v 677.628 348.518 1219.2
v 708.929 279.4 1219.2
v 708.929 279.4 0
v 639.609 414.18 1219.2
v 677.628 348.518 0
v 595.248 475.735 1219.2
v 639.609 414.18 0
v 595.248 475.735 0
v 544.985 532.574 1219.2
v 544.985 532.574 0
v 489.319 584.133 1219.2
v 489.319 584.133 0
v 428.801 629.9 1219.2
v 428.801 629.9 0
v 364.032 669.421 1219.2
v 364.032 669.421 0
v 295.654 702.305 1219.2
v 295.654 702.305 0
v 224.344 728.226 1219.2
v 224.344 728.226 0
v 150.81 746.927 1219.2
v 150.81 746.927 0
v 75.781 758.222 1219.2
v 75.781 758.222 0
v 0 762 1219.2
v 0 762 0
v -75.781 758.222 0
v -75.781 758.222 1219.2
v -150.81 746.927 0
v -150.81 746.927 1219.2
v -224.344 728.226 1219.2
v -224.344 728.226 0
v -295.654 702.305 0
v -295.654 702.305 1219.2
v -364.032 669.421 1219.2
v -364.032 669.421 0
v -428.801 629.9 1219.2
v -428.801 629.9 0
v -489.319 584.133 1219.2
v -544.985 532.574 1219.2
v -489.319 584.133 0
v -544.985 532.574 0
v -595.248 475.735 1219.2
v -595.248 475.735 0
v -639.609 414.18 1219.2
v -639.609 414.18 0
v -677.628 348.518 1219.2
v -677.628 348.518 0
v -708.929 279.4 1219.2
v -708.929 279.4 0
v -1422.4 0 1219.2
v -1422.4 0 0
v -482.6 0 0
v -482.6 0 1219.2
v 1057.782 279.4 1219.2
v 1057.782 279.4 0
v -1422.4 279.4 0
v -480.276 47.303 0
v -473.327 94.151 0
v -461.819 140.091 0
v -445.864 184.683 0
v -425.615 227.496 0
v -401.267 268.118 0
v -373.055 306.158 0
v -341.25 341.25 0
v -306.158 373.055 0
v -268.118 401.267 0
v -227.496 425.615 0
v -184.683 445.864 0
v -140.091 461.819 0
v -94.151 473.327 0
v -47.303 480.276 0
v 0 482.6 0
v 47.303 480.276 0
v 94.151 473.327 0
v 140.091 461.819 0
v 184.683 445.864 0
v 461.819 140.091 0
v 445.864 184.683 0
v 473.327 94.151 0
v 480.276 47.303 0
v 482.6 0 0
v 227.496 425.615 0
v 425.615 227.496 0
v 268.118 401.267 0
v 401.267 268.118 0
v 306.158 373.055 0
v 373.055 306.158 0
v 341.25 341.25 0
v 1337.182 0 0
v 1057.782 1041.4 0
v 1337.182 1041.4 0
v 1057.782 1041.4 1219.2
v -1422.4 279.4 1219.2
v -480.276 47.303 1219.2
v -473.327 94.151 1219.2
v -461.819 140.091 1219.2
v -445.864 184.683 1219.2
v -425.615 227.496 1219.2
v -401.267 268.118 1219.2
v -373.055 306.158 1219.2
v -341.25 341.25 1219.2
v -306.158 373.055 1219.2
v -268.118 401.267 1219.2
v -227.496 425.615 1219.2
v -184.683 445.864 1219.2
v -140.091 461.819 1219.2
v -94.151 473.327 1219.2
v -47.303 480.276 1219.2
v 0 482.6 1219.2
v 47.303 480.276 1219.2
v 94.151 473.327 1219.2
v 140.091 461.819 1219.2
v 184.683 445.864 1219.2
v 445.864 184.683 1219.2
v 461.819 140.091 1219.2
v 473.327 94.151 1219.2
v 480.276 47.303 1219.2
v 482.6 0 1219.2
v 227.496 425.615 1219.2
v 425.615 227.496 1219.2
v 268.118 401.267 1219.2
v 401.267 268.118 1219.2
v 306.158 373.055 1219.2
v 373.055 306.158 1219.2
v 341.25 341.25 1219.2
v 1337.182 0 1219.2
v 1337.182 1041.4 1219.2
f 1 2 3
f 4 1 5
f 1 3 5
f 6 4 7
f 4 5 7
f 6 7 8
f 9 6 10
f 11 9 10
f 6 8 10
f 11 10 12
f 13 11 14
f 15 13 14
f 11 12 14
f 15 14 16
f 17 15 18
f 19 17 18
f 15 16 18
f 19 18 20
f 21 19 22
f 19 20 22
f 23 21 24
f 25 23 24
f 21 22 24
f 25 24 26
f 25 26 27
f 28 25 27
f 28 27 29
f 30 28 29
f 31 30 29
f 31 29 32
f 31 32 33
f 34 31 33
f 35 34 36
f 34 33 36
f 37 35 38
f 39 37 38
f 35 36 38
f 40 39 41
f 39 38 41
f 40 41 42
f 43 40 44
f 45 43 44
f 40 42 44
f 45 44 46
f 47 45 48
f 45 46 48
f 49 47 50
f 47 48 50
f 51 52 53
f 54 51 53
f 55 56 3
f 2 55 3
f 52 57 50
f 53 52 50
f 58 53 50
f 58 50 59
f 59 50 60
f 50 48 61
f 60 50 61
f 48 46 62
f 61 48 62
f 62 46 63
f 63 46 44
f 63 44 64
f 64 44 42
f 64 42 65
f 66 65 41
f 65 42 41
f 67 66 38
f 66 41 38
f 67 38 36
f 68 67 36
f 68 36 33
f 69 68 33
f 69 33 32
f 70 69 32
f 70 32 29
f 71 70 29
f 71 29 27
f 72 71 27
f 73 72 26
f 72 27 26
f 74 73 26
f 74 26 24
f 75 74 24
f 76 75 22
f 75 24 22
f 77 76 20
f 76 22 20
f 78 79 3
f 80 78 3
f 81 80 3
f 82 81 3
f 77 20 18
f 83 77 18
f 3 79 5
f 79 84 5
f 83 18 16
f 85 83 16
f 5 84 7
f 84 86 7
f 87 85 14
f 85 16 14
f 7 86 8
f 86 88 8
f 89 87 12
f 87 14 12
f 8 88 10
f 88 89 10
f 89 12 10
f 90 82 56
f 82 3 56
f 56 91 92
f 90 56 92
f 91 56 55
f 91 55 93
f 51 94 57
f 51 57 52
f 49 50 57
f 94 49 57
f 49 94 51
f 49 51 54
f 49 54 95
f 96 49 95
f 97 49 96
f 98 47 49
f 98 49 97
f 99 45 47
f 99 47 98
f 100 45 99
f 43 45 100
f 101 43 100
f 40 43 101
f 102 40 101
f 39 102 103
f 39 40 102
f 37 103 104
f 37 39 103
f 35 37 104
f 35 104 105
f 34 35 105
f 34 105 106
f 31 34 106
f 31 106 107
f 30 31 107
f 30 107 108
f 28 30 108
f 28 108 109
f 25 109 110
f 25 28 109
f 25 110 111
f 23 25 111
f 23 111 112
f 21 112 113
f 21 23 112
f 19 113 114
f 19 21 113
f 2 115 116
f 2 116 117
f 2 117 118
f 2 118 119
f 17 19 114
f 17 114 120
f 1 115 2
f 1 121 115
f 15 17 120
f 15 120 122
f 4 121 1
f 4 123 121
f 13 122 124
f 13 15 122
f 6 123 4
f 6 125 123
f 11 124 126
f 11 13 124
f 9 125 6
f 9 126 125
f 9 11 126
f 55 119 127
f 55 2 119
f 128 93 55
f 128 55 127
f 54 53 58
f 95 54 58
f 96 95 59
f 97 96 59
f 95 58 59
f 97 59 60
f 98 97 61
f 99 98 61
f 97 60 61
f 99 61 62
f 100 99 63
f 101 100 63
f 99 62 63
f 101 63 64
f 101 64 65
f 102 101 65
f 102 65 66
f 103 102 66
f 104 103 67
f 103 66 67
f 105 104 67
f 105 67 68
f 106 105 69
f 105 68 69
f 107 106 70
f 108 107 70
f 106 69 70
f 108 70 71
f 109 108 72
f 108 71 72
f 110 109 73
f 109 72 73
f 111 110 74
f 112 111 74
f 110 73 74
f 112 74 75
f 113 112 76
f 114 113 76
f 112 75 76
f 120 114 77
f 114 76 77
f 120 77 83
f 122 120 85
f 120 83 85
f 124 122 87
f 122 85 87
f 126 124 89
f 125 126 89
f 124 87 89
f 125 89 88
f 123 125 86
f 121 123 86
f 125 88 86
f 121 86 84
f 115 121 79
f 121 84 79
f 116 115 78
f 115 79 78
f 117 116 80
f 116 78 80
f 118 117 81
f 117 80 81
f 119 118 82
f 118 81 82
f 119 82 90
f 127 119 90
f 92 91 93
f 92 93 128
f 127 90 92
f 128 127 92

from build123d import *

# Parameters (mm, degrees)
F0_W     = 279.4
F0_H     = 279.4
F0_H_2   = 762
F1_DEPTH = 1219.2


with BuildPart() as f1:
    # F0 (on Top) → F1 (new body)
    with BuildSketch(Plane.XY):
        with BuildLine():
            Line((482.6, 0), (762, 0))
            ThreePointArc((762, 0), (748.6145632978, 142.1978748731), (708.9285154372, 279.4))
            ThreePointArc((708.9285154372, 279.4), (0, 762), (-708.9285154372, 279.4))
            Line((-708.9285154372, 279.4), (-393.4951079747, 279.4))
            ThreePointArc((-393.4951079747, 279.4), (146.6322285369, 459.7844598878), (482.6, 0))
        make_face()
        with BuildLine():
            ThreePointArc((708.9285154372, 279.4), (748.6145632978, 142.1978748731), (762, 0))
            Line((762, 0), (1057.7820539474, 0))
            Line((1057.7820539474, 0), (1057.7820539474, 279.4))
            Line((1057.7820539474, 279.4), (708.9285154372, 279.4))
        make_face()
        with Locations((1197.4820539474, 139.7)):
            Rectangle(F0_W, F0_H)
        with BuildLine():
            Line((-393.4951079747, 279.4), (-708.9285154372, 279.4))
            ThreePointArc((-708.9285154372, 279.4), (-748.6145632978, 142.1978748731), (-762, 0))
            Line((-762, 0), (-482.6, 0))
            ThreePointArc((-482.6, 0), (-459.7844598878, 146.6322285369), (-393.4951079747, 279.4))
        make_face()
        with BuildLine():
            ThreePointArc((-762, 0), (-748.6145632978, 142.1978748731), (-708.9285154372, 279.4))
            Line((-708.9285154372, 279.4), (-1422.4, 279.4))
            Line((-1422.4, 279.4), (-1422.4, 0))
            Line((-1422.4, 0), (-762, 0))
        make_face()
        with Locations((1197.4820539474, 660.4)):
            Rectangle(F0_W, F0_H_2)
    extrude(amount=F1_DEPTH)


solid = f1.part
